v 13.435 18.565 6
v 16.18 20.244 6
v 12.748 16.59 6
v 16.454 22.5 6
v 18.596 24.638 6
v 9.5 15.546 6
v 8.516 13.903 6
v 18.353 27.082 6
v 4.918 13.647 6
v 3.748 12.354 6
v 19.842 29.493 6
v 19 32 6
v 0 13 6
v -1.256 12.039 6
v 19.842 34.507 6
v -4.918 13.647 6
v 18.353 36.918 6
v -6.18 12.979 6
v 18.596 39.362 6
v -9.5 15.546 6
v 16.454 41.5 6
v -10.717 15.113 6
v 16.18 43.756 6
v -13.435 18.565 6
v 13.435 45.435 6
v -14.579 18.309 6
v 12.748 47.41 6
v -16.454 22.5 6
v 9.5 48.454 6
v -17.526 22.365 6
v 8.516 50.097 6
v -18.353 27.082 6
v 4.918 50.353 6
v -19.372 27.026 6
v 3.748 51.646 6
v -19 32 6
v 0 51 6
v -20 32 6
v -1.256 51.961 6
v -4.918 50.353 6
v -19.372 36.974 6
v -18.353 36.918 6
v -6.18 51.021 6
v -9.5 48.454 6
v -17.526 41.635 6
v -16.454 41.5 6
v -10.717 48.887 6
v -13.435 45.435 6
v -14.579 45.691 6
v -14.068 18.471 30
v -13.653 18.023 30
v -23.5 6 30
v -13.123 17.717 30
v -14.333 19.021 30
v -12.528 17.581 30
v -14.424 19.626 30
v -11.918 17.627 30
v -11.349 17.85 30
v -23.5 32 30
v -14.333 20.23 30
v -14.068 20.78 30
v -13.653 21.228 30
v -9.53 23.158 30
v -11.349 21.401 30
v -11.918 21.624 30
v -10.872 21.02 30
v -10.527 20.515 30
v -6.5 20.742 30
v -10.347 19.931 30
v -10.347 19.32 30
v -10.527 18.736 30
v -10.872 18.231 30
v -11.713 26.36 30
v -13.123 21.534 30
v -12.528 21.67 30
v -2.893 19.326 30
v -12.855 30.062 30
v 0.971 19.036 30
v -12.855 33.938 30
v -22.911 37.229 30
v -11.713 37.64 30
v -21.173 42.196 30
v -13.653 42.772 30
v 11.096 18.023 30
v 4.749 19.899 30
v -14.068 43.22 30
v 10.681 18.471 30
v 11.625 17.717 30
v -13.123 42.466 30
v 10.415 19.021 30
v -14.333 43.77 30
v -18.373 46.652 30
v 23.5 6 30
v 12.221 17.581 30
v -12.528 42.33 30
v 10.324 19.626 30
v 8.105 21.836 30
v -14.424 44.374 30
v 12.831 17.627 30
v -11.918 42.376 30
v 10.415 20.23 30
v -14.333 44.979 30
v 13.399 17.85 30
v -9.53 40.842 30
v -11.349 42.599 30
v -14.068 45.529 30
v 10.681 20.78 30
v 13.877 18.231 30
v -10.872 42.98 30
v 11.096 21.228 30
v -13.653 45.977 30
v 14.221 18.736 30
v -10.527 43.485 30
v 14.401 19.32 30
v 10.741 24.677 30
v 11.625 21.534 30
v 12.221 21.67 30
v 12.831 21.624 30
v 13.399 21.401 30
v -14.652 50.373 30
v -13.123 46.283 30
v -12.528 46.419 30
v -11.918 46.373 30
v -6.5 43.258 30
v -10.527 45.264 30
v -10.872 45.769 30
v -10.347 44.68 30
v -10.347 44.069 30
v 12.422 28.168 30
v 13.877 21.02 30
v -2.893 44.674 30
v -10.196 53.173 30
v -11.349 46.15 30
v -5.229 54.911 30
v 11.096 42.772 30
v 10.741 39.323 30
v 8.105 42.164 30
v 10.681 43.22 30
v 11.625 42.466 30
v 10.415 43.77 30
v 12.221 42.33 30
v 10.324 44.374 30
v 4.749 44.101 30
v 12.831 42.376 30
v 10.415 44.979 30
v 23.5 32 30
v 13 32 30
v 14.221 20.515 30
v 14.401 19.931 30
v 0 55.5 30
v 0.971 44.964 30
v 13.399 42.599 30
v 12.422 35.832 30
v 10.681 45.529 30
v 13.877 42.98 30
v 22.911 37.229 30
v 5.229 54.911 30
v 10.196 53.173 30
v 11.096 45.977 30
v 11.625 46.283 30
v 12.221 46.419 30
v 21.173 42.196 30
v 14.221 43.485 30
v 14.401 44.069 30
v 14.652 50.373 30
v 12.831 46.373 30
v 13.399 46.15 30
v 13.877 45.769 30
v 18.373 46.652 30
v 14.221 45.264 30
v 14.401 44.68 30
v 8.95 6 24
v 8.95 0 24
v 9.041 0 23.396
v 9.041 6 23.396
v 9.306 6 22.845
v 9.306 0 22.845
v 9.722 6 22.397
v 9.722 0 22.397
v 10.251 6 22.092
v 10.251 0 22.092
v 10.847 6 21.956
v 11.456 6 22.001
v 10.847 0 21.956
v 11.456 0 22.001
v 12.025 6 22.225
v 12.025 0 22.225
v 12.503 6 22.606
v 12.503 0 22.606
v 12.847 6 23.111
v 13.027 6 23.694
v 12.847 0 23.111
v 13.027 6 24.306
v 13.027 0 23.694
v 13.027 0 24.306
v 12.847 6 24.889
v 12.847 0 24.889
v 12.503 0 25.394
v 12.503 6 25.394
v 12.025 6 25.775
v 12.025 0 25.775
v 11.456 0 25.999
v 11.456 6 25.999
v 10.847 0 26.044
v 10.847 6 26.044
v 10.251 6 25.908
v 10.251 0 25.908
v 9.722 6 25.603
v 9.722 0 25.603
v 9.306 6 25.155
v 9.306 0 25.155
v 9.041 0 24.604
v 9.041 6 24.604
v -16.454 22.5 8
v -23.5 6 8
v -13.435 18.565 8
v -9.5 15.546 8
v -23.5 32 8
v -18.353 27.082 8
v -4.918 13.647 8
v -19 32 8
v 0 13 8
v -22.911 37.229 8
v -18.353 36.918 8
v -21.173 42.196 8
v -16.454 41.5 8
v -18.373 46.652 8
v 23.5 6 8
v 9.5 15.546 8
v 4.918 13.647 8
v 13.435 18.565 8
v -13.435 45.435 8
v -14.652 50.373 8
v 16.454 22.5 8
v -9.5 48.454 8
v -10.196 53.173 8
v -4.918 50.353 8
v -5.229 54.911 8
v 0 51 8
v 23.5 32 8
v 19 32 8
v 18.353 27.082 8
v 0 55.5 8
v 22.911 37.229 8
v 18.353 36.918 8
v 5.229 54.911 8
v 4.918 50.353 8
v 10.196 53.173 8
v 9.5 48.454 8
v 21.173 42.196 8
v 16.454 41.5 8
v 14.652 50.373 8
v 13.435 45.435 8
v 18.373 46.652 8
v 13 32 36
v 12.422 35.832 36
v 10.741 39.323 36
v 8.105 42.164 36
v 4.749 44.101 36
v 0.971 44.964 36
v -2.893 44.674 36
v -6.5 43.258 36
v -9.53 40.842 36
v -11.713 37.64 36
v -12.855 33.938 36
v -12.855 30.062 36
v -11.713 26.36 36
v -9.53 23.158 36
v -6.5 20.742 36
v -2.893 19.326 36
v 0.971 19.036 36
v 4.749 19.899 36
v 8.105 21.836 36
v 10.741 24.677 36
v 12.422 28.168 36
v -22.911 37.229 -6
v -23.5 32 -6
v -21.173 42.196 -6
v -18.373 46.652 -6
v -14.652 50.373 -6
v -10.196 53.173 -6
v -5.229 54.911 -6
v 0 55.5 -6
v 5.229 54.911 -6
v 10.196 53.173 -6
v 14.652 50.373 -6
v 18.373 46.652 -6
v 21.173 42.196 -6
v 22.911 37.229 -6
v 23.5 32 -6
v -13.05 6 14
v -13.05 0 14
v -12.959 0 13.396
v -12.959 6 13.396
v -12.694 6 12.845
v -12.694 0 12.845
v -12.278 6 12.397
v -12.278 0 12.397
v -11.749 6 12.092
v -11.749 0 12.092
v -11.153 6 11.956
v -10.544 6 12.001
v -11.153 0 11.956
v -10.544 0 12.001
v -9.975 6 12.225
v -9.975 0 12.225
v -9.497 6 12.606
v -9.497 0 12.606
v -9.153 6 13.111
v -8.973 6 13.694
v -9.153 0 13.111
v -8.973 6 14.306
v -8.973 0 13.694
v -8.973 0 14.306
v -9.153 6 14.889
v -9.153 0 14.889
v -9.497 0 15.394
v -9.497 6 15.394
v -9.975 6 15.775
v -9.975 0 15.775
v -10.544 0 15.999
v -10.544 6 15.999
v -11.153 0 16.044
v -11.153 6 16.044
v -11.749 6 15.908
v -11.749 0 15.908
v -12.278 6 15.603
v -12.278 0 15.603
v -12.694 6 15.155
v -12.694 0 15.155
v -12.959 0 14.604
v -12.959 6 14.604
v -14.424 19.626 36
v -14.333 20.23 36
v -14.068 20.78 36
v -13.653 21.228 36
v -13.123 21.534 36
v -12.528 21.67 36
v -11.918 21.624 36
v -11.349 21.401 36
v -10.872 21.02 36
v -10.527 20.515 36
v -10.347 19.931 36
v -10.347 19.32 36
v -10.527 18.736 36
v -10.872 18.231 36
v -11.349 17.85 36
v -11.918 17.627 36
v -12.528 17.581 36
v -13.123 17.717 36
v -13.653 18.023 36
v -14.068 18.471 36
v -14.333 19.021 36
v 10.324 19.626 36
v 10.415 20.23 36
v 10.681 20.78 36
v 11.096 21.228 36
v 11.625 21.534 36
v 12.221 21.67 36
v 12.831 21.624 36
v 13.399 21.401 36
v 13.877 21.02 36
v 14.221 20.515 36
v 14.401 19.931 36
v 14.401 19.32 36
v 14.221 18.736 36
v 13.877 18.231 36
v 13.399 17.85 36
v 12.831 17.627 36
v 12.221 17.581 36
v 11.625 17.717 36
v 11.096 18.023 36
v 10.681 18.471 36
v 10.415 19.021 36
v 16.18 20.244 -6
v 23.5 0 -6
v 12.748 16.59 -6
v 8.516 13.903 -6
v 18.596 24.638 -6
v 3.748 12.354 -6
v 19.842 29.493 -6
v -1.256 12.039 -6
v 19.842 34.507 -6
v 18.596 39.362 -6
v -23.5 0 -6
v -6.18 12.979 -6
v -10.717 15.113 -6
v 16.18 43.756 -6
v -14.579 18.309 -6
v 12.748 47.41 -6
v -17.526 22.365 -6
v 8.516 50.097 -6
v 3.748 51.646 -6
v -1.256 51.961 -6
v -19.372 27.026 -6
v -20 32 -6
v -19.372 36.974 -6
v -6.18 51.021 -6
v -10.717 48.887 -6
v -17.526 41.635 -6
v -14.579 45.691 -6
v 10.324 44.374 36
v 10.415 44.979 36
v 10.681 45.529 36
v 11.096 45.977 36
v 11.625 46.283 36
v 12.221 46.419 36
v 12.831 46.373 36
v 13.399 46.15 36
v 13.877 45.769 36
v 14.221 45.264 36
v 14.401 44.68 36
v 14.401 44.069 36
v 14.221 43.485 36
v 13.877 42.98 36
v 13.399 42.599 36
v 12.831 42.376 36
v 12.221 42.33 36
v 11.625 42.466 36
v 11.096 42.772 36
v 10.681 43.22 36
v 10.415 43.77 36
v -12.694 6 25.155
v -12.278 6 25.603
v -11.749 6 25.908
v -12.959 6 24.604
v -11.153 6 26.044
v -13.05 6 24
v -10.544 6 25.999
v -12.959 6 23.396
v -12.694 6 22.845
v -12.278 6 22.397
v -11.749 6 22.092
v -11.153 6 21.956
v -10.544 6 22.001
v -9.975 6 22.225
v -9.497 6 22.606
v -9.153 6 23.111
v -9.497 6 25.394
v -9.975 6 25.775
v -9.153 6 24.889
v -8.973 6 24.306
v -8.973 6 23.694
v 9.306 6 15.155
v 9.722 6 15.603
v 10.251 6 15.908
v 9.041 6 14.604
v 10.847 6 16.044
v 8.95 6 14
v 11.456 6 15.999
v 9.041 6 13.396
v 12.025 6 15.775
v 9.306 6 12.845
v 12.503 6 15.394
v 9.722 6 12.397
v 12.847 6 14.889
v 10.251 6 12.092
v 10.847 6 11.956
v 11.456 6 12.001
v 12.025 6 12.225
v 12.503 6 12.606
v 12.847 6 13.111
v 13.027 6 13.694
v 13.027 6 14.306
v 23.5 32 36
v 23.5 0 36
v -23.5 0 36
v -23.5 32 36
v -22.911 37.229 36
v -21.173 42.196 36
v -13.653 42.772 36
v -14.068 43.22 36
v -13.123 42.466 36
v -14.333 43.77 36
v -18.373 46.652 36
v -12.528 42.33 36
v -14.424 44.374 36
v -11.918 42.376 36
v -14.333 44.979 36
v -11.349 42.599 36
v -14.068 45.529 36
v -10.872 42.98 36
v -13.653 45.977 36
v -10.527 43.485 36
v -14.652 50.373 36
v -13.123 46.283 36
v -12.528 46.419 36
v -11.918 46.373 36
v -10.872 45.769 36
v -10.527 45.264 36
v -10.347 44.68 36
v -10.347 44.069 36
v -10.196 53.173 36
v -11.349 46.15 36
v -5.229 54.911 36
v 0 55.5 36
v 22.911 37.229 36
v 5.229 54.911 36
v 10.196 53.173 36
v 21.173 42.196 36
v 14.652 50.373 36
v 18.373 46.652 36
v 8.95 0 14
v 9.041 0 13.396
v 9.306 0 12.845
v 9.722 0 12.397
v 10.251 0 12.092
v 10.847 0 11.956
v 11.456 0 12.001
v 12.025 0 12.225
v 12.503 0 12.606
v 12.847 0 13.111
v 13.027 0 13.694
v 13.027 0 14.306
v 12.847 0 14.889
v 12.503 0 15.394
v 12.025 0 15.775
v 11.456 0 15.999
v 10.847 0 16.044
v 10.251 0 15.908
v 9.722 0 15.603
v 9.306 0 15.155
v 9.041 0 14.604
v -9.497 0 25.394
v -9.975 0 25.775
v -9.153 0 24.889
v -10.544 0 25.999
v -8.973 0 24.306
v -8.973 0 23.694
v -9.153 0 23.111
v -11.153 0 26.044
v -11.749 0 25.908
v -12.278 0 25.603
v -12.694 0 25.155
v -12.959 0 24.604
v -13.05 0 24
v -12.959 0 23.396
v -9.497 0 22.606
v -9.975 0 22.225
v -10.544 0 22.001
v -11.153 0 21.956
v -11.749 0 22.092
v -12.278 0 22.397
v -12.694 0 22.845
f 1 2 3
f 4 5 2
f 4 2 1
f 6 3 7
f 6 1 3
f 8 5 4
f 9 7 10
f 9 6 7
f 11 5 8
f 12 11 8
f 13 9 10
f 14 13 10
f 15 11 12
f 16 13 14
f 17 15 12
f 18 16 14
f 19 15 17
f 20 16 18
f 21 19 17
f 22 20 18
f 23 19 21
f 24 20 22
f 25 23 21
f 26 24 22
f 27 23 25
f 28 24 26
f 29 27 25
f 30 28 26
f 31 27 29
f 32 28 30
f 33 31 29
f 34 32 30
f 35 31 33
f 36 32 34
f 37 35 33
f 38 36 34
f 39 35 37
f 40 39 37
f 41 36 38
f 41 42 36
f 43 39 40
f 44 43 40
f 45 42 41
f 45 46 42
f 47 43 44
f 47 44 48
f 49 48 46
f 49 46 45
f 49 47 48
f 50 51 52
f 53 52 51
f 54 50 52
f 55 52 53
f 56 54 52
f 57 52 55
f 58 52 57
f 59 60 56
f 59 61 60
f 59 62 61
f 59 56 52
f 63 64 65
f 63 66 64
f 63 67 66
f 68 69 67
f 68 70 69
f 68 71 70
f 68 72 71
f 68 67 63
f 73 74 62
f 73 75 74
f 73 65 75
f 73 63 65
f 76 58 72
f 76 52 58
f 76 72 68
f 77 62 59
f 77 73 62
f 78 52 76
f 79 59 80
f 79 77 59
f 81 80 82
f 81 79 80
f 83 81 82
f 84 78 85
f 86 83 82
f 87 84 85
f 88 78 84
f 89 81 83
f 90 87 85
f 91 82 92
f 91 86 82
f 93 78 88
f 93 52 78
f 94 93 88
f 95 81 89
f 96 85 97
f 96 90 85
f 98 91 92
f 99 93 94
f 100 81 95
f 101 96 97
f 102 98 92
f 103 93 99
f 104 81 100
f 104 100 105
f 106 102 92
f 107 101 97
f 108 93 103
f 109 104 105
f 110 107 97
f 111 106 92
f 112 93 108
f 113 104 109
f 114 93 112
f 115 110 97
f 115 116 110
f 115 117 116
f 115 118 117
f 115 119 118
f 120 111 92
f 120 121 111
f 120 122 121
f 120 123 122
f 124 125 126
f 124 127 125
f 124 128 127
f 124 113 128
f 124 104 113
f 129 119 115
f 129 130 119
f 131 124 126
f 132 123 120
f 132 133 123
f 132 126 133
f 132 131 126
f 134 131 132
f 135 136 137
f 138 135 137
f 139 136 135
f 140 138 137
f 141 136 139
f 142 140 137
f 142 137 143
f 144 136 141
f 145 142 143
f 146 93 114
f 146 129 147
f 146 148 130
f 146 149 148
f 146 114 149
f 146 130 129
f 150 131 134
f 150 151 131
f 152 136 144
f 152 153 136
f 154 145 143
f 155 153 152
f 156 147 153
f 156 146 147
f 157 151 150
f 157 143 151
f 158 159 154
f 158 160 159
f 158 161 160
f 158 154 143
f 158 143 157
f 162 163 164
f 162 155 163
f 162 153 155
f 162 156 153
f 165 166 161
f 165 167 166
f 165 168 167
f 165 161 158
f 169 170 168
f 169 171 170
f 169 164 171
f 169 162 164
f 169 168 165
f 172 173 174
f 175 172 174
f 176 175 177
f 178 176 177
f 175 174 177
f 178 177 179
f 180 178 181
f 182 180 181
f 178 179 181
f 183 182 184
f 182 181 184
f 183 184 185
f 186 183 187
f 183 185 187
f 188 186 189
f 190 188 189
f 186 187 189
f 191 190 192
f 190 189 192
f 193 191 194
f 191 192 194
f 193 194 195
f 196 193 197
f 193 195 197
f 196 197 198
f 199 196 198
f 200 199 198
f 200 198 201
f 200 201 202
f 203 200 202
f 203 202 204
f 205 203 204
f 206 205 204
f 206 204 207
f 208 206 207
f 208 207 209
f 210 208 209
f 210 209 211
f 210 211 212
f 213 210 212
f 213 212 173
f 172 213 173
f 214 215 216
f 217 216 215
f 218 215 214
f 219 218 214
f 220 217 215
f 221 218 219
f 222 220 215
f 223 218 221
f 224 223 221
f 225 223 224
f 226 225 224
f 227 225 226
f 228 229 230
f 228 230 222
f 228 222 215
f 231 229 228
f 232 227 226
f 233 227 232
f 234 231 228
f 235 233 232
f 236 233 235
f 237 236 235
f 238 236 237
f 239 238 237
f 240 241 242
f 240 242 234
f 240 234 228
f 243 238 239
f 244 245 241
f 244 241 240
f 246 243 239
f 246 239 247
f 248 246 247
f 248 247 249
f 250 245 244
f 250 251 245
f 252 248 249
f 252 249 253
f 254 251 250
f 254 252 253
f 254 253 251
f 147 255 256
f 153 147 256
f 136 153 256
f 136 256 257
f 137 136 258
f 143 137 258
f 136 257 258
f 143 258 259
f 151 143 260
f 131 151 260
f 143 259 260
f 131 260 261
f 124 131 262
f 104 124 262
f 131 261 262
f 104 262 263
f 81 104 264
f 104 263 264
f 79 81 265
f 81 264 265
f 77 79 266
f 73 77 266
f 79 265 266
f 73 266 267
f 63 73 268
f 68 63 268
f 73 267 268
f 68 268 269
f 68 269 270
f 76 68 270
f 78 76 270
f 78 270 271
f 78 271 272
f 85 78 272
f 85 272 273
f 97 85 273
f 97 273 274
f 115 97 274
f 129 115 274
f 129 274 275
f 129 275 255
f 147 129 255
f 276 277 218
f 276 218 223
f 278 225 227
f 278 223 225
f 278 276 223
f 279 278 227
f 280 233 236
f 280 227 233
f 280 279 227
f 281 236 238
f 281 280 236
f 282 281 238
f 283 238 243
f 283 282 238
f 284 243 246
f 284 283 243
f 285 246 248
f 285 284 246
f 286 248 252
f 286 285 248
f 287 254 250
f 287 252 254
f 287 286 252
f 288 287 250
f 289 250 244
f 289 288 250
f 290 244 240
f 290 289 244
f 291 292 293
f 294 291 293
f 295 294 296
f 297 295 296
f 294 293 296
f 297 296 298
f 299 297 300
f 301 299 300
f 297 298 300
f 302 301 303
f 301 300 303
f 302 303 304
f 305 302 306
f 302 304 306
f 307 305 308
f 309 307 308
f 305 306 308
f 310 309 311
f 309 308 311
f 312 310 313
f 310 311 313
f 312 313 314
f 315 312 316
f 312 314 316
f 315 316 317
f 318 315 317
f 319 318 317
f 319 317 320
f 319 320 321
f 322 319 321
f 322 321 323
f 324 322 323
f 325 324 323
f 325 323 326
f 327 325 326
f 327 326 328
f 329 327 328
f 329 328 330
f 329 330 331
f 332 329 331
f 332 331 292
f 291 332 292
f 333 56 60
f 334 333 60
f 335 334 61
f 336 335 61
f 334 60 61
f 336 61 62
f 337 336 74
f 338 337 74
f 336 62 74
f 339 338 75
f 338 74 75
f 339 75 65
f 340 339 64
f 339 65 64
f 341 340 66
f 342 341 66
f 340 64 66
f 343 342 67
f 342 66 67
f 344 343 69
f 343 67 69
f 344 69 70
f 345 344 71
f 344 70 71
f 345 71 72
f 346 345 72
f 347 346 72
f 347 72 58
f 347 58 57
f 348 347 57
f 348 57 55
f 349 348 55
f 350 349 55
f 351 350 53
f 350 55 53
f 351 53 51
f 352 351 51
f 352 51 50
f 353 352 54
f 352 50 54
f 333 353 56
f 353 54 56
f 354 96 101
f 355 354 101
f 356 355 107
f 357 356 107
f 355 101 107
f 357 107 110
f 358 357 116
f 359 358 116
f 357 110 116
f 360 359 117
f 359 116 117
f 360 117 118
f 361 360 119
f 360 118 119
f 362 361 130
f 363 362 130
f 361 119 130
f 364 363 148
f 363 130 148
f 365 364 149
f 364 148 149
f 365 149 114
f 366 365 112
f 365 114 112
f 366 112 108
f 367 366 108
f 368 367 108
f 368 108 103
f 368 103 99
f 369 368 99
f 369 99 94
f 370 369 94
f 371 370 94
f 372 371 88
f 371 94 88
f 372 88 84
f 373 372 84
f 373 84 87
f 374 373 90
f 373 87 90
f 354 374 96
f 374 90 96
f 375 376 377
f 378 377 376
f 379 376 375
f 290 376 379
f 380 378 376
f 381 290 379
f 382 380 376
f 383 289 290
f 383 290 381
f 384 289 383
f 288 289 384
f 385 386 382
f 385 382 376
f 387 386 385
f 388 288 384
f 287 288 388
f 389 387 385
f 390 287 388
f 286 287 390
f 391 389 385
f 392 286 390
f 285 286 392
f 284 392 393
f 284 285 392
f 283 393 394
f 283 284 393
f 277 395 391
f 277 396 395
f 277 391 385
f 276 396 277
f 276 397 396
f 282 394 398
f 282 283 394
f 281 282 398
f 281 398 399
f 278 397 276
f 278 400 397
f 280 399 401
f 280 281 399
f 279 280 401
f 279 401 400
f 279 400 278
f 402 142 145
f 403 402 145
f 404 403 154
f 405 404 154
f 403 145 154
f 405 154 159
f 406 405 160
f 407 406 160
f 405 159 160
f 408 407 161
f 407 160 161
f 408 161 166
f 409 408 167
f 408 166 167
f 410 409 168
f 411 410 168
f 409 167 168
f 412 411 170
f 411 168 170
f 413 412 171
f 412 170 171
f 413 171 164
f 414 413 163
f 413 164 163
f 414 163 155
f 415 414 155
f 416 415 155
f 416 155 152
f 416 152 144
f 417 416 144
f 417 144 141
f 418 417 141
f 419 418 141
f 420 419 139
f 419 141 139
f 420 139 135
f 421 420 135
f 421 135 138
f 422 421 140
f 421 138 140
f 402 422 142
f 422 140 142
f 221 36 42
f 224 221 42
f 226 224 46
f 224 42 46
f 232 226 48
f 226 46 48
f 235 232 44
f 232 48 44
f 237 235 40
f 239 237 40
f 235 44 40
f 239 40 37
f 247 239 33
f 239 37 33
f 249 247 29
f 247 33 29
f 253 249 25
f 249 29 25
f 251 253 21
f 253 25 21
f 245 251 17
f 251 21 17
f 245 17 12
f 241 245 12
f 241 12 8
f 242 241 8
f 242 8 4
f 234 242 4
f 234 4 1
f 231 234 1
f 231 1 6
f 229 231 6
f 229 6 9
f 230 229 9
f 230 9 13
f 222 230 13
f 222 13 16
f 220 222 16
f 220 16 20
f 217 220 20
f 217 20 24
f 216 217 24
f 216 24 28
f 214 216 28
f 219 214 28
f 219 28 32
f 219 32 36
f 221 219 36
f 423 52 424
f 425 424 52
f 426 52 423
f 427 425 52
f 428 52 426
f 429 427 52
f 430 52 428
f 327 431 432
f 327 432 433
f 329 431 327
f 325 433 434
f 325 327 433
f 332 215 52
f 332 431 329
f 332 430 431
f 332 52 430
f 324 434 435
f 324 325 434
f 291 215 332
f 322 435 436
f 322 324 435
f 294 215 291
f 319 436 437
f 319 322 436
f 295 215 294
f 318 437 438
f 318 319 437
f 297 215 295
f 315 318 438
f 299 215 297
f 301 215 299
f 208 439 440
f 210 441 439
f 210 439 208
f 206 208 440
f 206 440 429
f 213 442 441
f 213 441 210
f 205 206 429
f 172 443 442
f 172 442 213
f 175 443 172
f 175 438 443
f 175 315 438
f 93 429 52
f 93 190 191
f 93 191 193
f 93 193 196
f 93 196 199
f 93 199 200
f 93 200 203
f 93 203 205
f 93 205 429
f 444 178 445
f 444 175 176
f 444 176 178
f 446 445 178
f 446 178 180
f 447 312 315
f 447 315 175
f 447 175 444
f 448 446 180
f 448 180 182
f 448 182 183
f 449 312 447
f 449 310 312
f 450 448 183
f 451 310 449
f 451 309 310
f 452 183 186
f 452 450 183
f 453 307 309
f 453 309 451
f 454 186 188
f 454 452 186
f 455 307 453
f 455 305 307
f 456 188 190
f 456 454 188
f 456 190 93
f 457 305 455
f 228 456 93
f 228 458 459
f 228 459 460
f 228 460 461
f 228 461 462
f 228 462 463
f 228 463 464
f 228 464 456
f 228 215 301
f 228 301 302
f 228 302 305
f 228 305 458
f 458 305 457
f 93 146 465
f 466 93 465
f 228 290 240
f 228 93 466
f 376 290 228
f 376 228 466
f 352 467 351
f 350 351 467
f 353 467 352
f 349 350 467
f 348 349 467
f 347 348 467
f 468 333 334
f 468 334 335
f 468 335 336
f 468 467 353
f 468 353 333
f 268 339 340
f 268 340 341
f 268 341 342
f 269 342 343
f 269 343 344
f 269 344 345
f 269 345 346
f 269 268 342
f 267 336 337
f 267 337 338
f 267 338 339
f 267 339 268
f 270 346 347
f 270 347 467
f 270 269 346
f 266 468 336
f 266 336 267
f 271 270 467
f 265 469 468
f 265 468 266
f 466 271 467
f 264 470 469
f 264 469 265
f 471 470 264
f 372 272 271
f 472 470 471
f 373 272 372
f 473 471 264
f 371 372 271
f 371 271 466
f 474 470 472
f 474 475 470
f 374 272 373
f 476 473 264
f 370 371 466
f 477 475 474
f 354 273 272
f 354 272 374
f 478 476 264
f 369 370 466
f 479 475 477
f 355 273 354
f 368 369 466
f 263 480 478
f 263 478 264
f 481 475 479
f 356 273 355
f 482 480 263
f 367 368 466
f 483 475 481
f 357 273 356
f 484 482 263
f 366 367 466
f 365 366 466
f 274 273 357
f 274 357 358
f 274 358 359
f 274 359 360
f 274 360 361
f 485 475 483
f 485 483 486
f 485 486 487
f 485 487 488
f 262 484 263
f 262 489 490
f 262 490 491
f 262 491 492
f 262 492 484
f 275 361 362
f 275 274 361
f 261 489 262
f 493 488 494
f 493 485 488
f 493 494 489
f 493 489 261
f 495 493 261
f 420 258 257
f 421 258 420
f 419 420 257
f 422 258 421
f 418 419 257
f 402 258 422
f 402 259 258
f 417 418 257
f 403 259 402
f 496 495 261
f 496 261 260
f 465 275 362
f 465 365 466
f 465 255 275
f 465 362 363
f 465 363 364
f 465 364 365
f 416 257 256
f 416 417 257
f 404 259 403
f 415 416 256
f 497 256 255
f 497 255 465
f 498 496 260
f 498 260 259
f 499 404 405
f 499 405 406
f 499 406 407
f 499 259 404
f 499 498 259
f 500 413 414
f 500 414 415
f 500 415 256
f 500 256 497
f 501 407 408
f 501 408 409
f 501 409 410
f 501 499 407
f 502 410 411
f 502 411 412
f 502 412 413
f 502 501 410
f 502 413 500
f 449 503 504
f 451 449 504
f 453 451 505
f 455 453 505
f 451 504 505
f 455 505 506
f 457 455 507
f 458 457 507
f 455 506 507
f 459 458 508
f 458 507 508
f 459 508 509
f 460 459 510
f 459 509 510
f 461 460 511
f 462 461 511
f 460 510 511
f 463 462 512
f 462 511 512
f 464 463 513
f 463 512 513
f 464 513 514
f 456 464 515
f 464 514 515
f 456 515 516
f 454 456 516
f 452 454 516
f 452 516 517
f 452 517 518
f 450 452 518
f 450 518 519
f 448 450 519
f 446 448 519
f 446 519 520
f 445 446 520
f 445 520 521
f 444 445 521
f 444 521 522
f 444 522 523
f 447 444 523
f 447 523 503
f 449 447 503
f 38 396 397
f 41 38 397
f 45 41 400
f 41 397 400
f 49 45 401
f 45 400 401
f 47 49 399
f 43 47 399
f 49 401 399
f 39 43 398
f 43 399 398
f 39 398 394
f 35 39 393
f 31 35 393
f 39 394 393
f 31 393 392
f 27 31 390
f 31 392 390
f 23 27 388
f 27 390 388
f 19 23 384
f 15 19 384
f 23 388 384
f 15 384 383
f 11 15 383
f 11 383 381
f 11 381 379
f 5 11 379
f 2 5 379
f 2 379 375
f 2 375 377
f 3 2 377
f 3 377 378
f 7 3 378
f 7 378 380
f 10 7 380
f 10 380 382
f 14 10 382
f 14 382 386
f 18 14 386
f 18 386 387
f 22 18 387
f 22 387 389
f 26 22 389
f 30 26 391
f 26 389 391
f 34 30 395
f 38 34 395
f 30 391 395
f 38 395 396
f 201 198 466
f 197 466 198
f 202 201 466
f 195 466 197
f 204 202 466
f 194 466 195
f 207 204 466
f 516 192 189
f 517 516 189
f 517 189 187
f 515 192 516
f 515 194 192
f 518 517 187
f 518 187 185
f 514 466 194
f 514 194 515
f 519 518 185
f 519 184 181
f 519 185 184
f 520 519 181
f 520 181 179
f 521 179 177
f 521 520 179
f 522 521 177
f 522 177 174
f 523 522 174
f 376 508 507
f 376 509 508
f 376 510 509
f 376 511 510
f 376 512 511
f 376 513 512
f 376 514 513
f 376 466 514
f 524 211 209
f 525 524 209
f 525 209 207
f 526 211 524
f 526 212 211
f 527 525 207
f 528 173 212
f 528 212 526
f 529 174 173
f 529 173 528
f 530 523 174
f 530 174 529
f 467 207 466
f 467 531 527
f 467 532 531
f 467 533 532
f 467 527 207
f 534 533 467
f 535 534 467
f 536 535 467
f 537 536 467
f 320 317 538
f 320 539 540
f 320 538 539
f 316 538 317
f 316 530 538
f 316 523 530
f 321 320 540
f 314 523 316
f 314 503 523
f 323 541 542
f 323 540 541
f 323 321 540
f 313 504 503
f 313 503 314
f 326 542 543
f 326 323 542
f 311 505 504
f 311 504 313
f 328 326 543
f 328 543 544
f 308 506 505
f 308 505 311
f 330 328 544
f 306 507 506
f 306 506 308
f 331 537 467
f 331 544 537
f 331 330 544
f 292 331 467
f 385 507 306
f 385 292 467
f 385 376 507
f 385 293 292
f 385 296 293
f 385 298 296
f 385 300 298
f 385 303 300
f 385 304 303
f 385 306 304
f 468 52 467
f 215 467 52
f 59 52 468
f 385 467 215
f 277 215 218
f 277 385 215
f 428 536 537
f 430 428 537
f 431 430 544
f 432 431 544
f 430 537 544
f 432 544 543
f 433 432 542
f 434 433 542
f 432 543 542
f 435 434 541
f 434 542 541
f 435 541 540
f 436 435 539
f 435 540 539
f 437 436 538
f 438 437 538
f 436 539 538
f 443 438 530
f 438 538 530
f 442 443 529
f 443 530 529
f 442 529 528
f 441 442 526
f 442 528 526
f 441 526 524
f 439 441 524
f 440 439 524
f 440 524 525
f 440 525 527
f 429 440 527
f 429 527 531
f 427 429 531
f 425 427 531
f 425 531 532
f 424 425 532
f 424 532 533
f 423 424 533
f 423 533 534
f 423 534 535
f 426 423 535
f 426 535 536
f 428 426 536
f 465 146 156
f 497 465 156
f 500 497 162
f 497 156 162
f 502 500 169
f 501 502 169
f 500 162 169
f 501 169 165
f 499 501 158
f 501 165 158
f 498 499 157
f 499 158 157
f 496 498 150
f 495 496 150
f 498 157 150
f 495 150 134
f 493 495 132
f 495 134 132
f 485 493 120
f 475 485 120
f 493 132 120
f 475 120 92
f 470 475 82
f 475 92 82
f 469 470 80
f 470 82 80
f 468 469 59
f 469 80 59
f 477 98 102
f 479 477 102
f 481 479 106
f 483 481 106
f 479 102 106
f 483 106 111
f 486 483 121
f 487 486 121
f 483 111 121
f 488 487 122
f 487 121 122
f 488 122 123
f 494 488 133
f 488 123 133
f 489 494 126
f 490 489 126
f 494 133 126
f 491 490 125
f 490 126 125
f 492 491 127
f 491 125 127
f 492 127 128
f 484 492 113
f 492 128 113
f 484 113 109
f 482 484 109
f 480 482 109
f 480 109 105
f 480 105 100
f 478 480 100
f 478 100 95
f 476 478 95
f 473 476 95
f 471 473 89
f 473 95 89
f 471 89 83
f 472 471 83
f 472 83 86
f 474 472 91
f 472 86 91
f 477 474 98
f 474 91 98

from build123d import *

# Parameters (mm, degrees)
EXTRUDE_1_DEPTH        = 36
SKETCH_3_R             = 13
CUT_EXTRUDE_1_DEPTH    = 20
HOLE_WIZARD_M4_1_D     = 4.1
HOLE_WIZARD_M4_1_DEPTH = 20
HOLE_WIZARD_M4_1_TIP   = 1.231764269
SKETCH_17_W            = 22
SKETCH_17_H            = 45.5
CUT_EXTRUDE_4_DEPTH    = 82.149553295
HOLE_WIZARD_M4_2_D     = 4.1
HOLE_WIZARD_M4_2_DEPTH = 10.1
HOLE_WIZARD_M4_2_TIP   = 1.231764269
SKETCH_21_R            = 20
CUT_EXTRUDE_5_DEPTH    = 6
SKETCH_22_R            = 19
CUT_EXTRUDE_6_DEPTH    = 10
SKETCH_26_W            = 47
SKETCH_26_H            = 22
CUT_EXTRUDE_8_DEPTH    = 4
EXTRUDE_START          = 6
SKETCH_27_R            = 20
EXTRUDE_2_DEPTH        = 6


with BuildPart() as part:
    # 草图2 → 凸台-拉伸1 (new body)
    with BuildSketch(Plane.XY):
        with BuildLine():
            Line((-23.5, 32), (-23.5, 0))
            Line((-23.5, 0), (23.5, 0))
            Line((23.5, 0), (23.5, 32))
            ThreePointArc((23.5, 32), (0, 55.5), (-23.5, 32))
        make_face()
    extrude(amount=EXTRUDE_1_DEPTH)

    # 草图3 → 切除-拉伸1 (cut)
    with BuildSketch(Plane.XY.offset(36)):
        with Locations((0, 32)):
            Circle(SKETCH_3_R)
    extrude(amount=-CUT_EXTRUDE_1_DEPTH, mode=Mode.SUBTRACT)

    # M4 间隙孔1
    with Locations(Plane.XY.offset(36)):
        with Locations((12.374368671, 19.625631329), (-12.374368671, 44.374368671), (12.374368671, 44.374368671), (-12.374368671, 19.625631329)):
            Hole(HOLE_WIZARD_M4_1_D / 2, depth=HOLE_WIZARD_M4_1_DEPTH)
            with Locations((0, 0, -(HOLE_WIZARD_M4_1_DEPTH + HOLE_WIZARD_M4_1_TIP / 2))):  # 118° drill point
                Cone(0, HOLE_WIZARD_M4_1_D / 2, HOLE_WIZARD_M4_1_TIP, mode=Mode.SUBTRACT)

    # 草图17 → 切除-拉伸4 (cut, through all)
    with BuildSketch(Plane(origin=(23.5, 0, 0), x_dir=(0, 0, -1), z_dir=(1, 0, 0))):
        with Locations((-19, 32.75)):
            Rectangle(SKETCH_17_W, SKETCH_17_H)
    extrude(amount=-CUT_EXTRUDE_4_DEPTH, mode=Mode.SUBTRACT)

    # M4 间隙孔2
    with Locations(Plane(origin=(0, 10, 0), x_dir=(1, 0, 0), z_dir=(0, 1, 0))):
        with Locations((-11, -14), (11, -14), (11, -24), (-11, -24)):
            Hole(HOLE_WIZARD_M4_2_D / 2, depth=HOLE_WIZARD_M4_2_DEPTH)
            with Locations((0, 0, -(HOLE_WIZARD_M4_2_DEPTH + HOLE_WIZARD_M4_2_TIP / 2))):  # 118° drill point
                Cone(0, HOLE_WIZARD_M4_2_D / 2, HOLE_WIZARD_M4_2_TIP, mode=Mode.SUBTRACT)

    # 草图21 → 切除-拉伸5 (cut)
    with BuildSketch(Plane(origin=(0, 0, 0), x_dir=(-1, 0, 0), z_dir=(0, 0, -1))):
        with Locations((0, 32)):
            Circle(SKETCH_21_R)
    extrude(amount=-CUT_EXTRUDE_5_DEPTH, mode=Mode.SUBTRACT)

    # 草图22 → 切除-拉伸6 (cut)
    with BuildSketch(Plane(origin=(0, 0, 6), x_dir=(-1, 0, 0), z_dir=(0, 0, -1))):
        with Locations((0, 32)):
            Circle(SKETCH_22_R)
    extrude(amount=-CUT_EXTRUDE_6_DEPTH, mode=Mode.SUBTRACT)

    # 草图26 → 切除-拉伸8 (cut)
    with BuildSketch(Plane(origin=(0, 10, 0), x_dir=(1, 0, 0), z_dir=(0, 1, 0))):
        with Locations((0, -19)):
            Rectangle(SKETCH_26_W, SKETCH_26_H)
    extrude(amount=-CUT_EXTRUDE_8_DEPTH, mode=Mode.SUBTRACT)

    # 草图27 → 凸台-拉伸2 (add)
    with BuildSketch(Plane(origin=(0, 0, 0), x_dir=(-1, 0, 0), z_dir=(0, 0, -1)).offset(EXTRUDE_START)):
        with BuildLine():
            Line((-23.5, 32), (-23.5, 0))
            Line((-23.5, 0), (23.5, 0))
            Line((23.5, 0), (23.5, 32))
            ThreePointArc((23.5, 32), (0, 55.5), (-23.5, 32))
        make_face()
        with Locations((0, 32)):
            Circle(SKETCH_27_R, mode=Mode.SUBTRACT)
    extrude(amount=-EXTRUDE_2_DEPTH)


solid = part.part
